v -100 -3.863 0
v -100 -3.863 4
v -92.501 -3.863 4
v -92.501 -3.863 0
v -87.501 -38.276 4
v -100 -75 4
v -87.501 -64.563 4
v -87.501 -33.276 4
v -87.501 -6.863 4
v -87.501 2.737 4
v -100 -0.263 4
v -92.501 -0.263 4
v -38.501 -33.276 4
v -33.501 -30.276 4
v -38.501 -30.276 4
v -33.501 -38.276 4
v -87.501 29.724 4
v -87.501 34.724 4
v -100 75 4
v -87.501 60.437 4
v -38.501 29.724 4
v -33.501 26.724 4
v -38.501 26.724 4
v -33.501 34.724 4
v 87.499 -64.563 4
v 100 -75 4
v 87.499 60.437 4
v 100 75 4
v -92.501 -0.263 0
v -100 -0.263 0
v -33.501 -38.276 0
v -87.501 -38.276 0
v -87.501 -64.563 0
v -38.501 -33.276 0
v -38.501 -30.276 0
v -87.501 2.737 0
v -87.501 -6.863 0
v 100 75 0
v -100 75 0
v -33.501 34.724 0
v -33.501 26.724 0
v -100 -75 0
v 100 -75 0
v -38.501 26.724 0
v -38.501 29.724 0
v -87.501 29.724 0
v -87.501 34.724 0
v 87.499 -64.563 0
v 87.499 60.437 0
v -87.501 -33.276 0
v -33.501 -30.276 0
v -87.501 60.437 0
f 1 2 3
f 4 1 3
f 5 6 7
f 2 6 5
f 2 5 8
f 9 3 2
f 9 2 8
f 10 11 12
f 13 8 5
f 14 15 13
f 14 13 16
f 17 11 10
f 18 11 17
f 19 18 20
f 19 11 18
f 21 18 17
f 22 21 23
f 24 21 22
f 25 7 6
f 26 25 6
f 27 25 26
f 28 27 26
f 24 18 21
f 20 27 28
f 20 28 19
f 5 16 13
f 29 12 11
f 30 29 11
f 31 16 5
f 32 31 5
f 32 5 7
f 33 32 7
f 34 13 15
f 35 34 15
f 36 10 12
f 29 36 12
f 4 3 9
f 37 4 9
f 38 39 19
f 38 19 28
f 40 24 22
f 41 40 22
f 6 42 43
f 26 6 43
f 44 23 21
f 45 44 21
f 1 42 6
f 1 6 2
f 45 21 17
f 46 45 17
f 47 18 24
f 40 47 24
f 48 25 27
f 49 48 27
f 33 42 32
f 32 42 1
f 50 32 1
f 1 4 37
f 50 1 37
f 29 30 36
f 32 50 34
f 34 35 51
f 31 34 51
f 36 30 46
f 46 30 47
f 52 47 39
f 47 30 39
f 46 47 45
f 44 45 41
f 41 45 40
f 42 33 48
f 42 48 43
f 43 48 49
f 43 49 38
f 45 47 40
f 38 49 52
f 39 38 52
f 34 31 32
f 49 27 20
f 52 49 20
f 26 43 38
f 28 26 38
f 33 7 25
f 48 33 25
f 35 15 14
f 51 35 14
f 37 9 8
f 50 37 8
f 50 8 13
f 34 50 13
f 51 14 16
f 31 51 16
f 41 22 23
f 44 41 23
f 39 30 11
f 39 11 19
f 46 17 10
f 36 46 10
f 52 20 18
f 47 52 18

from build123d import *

# Parameters (mm, degrees)
F0_W     = 200
F0_H     = 150
F1_DEPTH = 4
F2_W     = 10
F2_H     = 12.5
F3_DEPTH = 25


with BuildPart() as f1:
    # F0 (on Top) → F1 (new body)
    with BuildSketch(Plane.XY):
        Rectangle(F0_W, F0_H)
    extrude(amount=F1_DEPTH)

    # F2 (on face) → F3 (cut)
    with BuildSketch(Plane.XY.offset(4)):
        Polygon((87.4994372893, -64.5627596692), (87.4994372893, 60.4372403308), (-87.5005627107, 60.4372403308), (-87.5005627107, 34.7239444211), (-41.0005627107, 34.7239444211), (-33.5005627107, 34.7239444211), (-33.5005627107, 26.7239444211), (-38.5005627107, 26.7239444211), (-38.5005627107, 29.7239444211), (-46.0005627107, 29.7239444211), (-87.5005627107, 29.7239444211), (-87.5005627107, 2.7372403308), (-92.5005627107, -0.2627596692), (-100, -0.2627596692), (-100, -3.8627596692), (-92.5005627107, -3.8627596692), (-87.5005627107, -6.8627596692), (-87.5005627107, -33.2760555789), (-38.5005627107, -33.2760555789), (-38.5005627107, -30.2760555789), (-33.5005627107, -30.2760555789), (-33.5005627107, -38.2760555789), (-41.0005627107, -38.2760555789), (-46.0005627107, -38.2760555789), (-87.5005627107, -38.2760555789), (-87.5005627107, -64.5627596692), (-77.5005627107, -64.5627596692), align=None)
        with BuildLine():
            Line((-77.3623862099, 50.4372403308), (-74.3623862099, 50.4372403308))
            Line((-74.3623862099, 50.4372403308), (60.6376137901, 50.4372403308))
            Line((60.6376137901, 50.4372403308), (74.4994372893, 50.4372403308))
            Line((74.4994372893, 50.4372403308), (77.4994372893, 50.4372403308))
            Line((77.4994372893, 50.4372403308), (77.4994372893, 47.4372403308))
            Line((77.4994372893, 47.4372403308), (77.4994372893, -54.5627596692))
            Line((77.4994372893, -54.5627596692), (60.6376137901, -54.5627596692))
            Line((60.6376137901, -54.5627596692), (-77.5005627107, -54.5627596692))
            Line((-77.5005627107, -54.5627596692), (-77.5005627107, -51.5627596692))
            Line((-77.5005627107, -51.5627596692), (60.6376137901, -51.5627596692))
            Line((60.6376137901, -51.5627596692), (69.4994372893, -51.5627596692))
            ThreePointArc((69.4994372893, -51.5627596692), (73.0349711952, -50.0982935751), (74.4994372893, -46.5627596692))
            Line((74.4994372893, -46.5627596692), (74.4994372893, 42.4372403308))
            ThreePointArc((74.4994372893, 42.4372403308), (73.0349711952, 45.9727742368), (69.4994372893, 47.4372403308))
            Line((69.4994372893, 47.4372403308), (60.6376137901, 47.4372403308))
            Line((60.6376137901, 47.4372403308), (57.6376137901, 47.4372403308))
            Line((57.6376137901, 47.4372403308), (-74.3623862099, 47.4372403308))
            Line((-74.3623862099, 47.4372403308), (-77.3623862099, 47.4372403308))
            Line((-77.3623862099, 47.4372403308), (-77.3623862099, 50.4372403308))
        make_face(mode=Mode.SUBTRACT)
        Polygon((39.9994372893, -27.0627596692), (39.9994372893, -2.0627596692), (39.9994372893, 22.9372403308), (39.9994372893, 35.4372403308), (49.9994372893, 35.4372403308), (49.9994372893, 22.9372403308), (49.9994372893, -27.0627596692), (49.9994372893, -39.5627596692), (39.9994372893, -39.5627596692), align=None, mode=Mode.SUBTRACT)
        with BuildLine():
            Line((60.6376137901, 50.4372403308), (-74.3623862099, 50.4372403308))
            Line((-74.3623862099, 50.4372403308), (-77.3623862099, 50.4372403308))
            Line((-77.3623862099, 50.4372403308), (-77.3623862099, 47.4372403308))
            Line((-77.3623862099, 47.4372403308), (-74.3623862099, 47.4372403308))
            Line((-74.3623862099, 47.4372403308), (57.6376137901, 47.4372403308))
            Line((57.6376137901, 47.4372403308), (60.6376137901, 47.4372403308))
            Line((60.6376137901, 47.4372403308), (69.4994372893, 47.4372403308))
            ThreePointArc((69.4994372893, 47.4372403308), (73.0349711952, 45.9727742368), (74.4994372893, 42.4372403308))
            Line((74.4994372893, 42.4372403308), (74.4994372893, -46.5627596692))
            ThreePointArc((74.4994372893, -46.5627596692), (73.0349711952, -50.0982935751), (69.4994372893, -51.5627596692))
            Line((69.4994372893, -51.5627596692), (60.6376137901, -51.5627596692))
            Line((60.6376137901, -51.5627596692), (-77.5005627107, -51.5627596692))
            Line((-77.5005627107, -51.5627596692), (-77.5005627107, -54.5627596692))
            Line((-77.5005627107, -54.5627596692), (60.6376137901, -54.5627596692))
            Line((60.6376137901, -54.5627596692), (77.4994372893, -54.5627596692))
            Line((77.4994372893, -54.5627596692), (77.4994372893, 47.4372403308))
            Line((77.4994372893, 47.4372403308), (77.4994372893, 50.4372403308))
            Line((77.4994372893, 50.4372403308), (74.4994372893, 50.4372403308))
            Line((74.4994372893, 50.4372403308), (60.6376137901, 50.4372403308))
        make_face()
        with Locations((44.9994372893, 29.1872403308)):
            Rectangle(F2_W, F2_H)
        Polygon((39.9994372893, 22.9372403308), (39.9994372893, -2.0627596692), (39.9994372893, -27.0627596692), (49.9994372893, -27.0627596692), (49.9994372893, 22.9372403308), align=None)
        with Locations((44.9994372893, -33.3127596692)):
            Rectangle(F2_W, F2_H)
    extrude(amount=-F3_DEPTH, mode=Mode.SUBTRACT)


solid = f1.part
